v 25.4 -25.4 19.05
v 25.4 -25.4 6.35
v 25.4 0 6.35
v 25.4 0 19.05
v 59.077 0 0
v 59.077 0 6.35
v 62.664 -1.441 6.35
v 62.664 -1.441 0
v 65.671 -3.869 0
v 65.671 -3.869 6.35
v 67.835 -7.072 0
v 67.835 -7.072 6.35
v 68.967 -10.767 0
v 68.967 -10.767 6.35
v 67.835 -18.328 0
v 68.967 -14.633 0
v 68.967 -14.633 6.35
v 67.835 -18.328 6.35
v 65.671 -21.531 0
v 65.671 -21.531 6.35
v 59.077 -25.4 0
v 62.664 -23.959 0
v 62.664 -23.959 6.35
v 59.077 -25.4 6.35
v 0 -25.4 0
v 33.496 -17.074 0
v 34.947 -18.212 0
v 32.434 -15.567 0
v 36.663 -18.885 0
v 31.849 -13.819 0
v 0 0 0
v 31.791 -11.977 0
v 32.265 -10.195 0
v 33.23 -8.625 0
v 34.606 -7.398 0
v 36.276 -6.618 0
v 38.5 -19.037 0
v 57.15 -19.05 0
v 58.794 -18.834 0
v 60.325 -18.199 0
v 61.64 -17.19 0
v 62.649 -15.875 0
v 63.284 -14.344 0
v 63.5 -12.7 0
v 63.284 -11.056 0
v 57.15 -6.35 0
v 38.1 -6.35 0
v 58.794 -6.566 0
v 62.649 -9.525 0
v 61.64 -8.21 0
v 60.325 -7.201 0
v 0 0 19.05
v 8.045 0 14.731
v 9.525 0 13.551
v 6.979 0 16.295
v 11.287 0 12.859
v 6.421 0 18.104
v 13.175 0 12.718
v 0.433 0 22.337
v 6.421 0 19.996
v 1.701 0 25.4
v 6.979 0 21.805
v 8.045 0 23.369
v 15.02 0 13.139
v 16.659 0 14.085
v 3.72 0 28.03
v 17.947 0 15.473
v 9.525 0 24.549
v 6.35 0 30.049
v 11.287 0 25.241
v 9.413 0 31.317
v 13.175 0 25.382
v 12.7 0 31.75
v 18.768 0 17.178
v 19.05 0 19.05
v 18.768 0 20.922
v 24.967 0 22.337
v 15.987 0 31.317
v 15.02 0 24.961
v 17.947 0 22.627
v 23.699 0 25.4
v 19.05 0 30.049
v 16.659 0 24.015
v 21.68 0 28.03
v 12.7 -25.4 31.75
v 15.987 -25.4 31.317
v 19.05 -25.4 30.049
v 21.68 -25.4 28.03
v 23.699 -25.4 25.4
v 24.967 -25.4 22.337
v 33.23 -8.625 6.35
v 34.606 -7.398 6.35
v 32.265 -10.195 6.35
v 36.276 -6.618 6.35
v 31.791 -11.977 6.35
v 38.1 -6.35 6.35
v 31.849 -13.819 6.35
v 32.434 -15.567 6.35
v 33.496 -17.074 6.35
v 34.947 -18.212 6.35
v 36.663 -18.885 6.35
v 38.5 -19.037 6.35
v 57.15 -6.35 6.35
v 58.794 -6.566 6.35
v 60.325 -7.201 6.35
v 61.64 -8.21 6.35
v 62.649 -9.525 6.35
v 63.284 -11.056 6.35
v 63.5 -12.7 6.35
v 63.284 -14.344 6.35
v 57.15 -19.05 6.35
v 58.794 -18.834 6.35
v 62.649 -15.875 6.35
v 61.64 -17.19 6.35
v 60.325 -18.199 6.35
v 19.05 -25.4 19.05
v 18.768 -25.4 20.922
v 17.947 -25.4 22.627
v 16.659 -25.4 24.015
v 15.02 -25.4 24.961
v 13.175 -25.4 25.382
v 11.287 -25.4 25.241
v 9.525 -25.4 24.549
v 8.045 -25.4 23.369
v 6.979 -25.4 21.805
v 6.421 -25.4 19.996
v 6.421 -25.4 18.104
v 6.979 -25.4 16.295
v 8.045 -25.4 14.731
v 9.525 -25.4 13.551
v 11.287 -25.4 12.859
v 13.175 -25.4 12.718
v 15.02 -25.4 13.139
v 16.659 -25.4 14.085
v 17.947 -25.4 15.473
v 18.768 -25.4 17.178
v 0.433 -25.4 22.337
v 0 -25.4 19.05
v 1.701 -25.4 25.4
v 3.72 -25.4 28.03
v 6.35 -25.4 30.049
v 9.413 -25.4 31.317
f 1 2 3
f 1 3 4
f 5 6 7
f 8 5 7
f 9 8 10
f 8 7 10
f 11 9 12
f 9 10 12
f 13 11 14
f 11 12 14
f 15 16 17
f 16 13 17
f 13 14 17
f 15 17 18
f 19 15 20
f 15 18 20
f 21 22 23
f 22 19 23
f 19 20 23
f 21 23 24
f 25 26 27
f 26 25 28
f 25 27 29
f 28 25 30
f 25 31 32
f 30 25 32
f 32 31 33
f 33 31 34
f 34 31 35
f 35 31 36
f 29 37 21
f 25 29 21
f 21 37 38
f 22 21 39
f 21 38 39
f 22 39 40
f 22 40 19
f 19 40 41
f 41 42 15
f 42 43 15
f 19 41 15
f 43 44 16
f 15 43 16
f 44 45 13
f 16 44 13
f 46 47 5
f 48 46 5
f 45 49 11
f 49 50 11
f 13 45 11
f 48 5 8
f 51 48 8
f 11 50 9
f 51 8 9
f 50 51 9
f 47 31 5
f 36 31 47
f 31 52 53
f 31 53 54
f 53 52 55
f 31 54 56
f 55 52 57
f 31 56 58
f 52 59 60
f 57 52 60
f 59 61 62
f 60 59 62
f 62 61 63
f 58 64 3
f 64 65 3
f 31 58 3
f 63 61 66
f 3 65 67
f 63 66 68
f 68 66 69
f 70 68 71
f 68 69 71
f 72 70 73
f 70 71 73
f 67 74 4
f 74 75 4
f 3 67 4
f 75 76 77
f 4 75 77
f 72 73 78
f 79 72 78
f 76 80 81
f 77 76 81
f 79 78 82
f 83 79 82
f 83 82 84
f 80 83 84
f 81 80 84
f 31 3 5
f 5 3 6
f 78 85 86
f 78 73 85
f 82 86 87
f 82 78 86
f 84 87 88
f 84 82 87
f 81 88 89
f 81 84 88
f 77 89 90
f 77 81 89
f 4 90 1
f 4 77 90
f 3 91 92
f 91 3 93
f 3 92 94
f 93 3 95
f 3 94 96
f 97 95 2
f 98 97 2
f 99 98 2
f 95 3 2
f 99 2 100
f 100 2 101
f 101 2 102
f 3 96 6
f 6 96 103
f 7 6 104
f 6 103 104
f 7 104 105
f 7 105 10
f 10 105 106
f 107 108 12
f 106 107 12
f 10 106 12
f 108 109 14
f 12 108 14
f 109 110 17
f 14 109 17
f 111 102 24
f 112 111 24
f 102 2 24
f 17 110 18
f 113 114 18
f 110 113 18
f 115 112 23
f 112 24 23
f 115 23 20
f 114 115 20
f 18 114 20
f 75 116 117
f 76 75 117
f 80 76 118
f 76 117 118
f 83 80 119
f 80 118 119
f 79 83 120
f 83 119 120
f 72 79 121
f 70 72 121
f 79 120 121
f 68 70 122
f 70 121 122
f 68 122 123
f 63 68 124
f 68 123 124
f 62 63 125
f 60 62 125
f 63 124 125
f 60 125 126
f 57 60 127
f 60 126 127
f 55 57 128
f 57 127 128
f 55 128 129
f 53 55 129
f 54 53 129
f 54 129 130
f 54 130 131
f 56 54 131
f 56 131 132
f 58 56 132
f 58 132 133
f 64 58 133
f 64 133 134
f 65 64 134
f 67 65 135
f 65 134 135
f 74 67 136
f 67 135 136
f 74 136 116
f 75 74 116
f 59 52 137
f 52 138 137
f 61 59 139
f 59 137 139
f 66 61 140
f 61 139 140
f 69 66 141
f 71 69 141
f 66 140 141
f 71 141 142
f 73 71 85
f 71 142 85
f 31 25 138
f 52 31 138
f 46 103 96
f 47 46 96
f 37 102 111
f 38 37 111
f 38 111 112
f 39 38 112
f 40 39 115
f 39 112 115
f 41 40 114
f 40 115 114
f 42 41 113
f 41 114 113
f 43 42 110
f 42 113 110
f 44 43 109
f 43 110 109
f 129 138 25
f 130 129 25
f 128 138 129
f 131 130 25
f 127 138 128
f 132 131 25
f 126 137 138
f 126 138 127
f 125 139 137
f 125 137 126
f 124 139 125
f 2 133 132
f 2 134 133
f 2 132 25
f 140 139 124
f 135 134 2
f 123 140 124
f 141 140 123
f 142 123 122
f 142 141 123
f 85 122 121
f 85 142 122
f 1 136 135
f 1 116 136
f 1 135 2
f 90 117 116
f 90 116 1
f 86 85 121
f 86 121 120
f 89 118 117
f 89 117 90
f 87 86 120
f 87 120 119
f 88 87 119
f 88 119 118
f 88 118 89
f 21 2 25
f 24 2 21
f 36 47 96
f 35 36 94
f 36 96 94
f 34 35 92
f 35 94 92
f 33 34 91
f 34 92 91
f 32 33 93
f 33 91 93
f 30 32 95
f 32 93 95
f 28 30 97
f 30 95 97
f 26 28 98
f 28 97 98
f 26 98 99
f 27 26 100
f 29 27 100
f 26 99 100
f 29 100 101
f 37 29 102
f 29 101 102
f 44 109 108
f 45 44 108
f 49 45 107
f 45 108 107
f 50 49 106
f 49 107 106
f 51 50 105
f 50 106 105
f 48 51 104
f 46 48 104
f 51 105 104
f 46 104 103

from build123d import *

# Parameters (mm, degrees)
F0_W      = 69.85
F0_H      = 31.75
F1_DEPTH  = 25.4
F2_W      = 44.45
F2_H      = 25.4
F3_DEPTH  = 25.4
F4_R      = 12.69999
F5_R      = 6.35
F7_DEPTH  = 25.4
F8_DEPTH  = 25.4
F10_DEPTH = 25.4
F11_R     = 6.35
F12_DEPTH = 25.4
F14_DEPTH = 25.4


# Not quite as in the source:
# - a fillet or chamfer is up to 0.001 mm smaller than in the source, because OpenCascade refuses the exact size
# - ends of sketch curves that miss each other by under 0.0002 mm in the source are joined


with BuildPart() as f1:
    # F0 (on Front) → F1 (new body)
    with BuildSketch(Plane.XZ):
        with Locations((34.925, 15.875)):
            Rectangle(F0_W, F0_H)
    extrude(amount=F1_DEPTH)

    # F2 (on face) → F3 (cut)
    with BuildSketch(Plane.XZ.offset(25.4)):
        with Locations((47.625, 19.05)):
            Rectangle(F2_W, F2_H)
    extrude(amount=-F3_DEPTH, mode=Mode.SUBTRACT)

    # F4 (radius 12.7 in the source; OpenCascade refuses exactly that, so slightly less here)
    f4_edges = [f1.edges().sort_by_distance(p)[0] for p in [
        (25.4, -12.7, 31.75),
        (0, -12.7, 31.75),
    ]]
    fillet(f4_edges, radius=F4_R)

    # F5 (on face) → F7 (cut)
    with BuildSketch(Plane.XY.offset(6.35)):
        with Locations((38.1, -12.7)):
            Circle(F5_R)
    extrude(amount=-F7_DEPTH, mode=Mode.SUBTRACT)

    # F6 (on face) → F8 (cut)
    with BuildSketch(Plane.XY.offset(6.35)):
        with BuildLine():
            ThreePointArc((57.15, -19.05), (61.6401280605, -17.1901280605), (63.5, -12.7))
            ThreePointArc((63.5, -12.7), (61.6401280605, -8.2098719395), (57.15, -6.35))
            Line((57.15, -6.35), (38.1, -6.35))
            ThreePointArc((38.1, -6.35), (42.5901280605, -8.2098719395), (44.45, -12.7))
            ThreePointArc((44.45, -12.7), (42.7293038012, -17.046498167), (38.4997491919, -19.0374048777))
            Line((38.4997491919, -19.0374048777), (57.15, -19.05))
        make_face()
    extrude(amount=-F8_DEPTH, mode=Mode.SUBTRACT)

    # F9 (on face) → F10 (cut)
    with BuildSketch(Plane.XY.offset(6.35)):
        with BuildLine():
            ThreePointArc((63.8472363353, 0), (69.4711968718, -12.5871403191), (64.3824189901, -25.4))
            Line((64.3824189901, -25.4), (69.85, -25.4))
            Line((69.85, -25.4), (69.85, 0))
            Line((69.85, 0), (63.8472363353, 0))
        make_face()
    extrude(amount=-F10_DEPTH, mode=Mode.SUBTRACT)

    # F11 (on face) → F12 (cut)
    with BuildSketch(Plane.XZ.offset(25.4)):
        with Locations((12.7, 19.05)):
            Circle(F11_R)
    extrude(amount=-F12_DEPTH, mode=Mode.SUBTRACT)

    # F13 (on face) → F14 (cut)
    with BuildSketch(Plane.XY.offset(6.35)):
        with BuildLine():
            ThreePointArc((59.0771511197, 0), (69.1111732298, -12.7), (59.0771511197, -25.4))
            Line((59.0771511197, -25.4), (64.3824189901, -25.4))
            ThreePointArc((64.3824189901, -25.4), (69.4711968718, -12.5871403191), (63.8472363353, 0))
            Line((63.8472363353, 0), (59.0771511197, 0))
        make_face()
    extrude(amount=-F14_DEPTH, mode=Mode.SUBTRACT)


solid = f1.part
